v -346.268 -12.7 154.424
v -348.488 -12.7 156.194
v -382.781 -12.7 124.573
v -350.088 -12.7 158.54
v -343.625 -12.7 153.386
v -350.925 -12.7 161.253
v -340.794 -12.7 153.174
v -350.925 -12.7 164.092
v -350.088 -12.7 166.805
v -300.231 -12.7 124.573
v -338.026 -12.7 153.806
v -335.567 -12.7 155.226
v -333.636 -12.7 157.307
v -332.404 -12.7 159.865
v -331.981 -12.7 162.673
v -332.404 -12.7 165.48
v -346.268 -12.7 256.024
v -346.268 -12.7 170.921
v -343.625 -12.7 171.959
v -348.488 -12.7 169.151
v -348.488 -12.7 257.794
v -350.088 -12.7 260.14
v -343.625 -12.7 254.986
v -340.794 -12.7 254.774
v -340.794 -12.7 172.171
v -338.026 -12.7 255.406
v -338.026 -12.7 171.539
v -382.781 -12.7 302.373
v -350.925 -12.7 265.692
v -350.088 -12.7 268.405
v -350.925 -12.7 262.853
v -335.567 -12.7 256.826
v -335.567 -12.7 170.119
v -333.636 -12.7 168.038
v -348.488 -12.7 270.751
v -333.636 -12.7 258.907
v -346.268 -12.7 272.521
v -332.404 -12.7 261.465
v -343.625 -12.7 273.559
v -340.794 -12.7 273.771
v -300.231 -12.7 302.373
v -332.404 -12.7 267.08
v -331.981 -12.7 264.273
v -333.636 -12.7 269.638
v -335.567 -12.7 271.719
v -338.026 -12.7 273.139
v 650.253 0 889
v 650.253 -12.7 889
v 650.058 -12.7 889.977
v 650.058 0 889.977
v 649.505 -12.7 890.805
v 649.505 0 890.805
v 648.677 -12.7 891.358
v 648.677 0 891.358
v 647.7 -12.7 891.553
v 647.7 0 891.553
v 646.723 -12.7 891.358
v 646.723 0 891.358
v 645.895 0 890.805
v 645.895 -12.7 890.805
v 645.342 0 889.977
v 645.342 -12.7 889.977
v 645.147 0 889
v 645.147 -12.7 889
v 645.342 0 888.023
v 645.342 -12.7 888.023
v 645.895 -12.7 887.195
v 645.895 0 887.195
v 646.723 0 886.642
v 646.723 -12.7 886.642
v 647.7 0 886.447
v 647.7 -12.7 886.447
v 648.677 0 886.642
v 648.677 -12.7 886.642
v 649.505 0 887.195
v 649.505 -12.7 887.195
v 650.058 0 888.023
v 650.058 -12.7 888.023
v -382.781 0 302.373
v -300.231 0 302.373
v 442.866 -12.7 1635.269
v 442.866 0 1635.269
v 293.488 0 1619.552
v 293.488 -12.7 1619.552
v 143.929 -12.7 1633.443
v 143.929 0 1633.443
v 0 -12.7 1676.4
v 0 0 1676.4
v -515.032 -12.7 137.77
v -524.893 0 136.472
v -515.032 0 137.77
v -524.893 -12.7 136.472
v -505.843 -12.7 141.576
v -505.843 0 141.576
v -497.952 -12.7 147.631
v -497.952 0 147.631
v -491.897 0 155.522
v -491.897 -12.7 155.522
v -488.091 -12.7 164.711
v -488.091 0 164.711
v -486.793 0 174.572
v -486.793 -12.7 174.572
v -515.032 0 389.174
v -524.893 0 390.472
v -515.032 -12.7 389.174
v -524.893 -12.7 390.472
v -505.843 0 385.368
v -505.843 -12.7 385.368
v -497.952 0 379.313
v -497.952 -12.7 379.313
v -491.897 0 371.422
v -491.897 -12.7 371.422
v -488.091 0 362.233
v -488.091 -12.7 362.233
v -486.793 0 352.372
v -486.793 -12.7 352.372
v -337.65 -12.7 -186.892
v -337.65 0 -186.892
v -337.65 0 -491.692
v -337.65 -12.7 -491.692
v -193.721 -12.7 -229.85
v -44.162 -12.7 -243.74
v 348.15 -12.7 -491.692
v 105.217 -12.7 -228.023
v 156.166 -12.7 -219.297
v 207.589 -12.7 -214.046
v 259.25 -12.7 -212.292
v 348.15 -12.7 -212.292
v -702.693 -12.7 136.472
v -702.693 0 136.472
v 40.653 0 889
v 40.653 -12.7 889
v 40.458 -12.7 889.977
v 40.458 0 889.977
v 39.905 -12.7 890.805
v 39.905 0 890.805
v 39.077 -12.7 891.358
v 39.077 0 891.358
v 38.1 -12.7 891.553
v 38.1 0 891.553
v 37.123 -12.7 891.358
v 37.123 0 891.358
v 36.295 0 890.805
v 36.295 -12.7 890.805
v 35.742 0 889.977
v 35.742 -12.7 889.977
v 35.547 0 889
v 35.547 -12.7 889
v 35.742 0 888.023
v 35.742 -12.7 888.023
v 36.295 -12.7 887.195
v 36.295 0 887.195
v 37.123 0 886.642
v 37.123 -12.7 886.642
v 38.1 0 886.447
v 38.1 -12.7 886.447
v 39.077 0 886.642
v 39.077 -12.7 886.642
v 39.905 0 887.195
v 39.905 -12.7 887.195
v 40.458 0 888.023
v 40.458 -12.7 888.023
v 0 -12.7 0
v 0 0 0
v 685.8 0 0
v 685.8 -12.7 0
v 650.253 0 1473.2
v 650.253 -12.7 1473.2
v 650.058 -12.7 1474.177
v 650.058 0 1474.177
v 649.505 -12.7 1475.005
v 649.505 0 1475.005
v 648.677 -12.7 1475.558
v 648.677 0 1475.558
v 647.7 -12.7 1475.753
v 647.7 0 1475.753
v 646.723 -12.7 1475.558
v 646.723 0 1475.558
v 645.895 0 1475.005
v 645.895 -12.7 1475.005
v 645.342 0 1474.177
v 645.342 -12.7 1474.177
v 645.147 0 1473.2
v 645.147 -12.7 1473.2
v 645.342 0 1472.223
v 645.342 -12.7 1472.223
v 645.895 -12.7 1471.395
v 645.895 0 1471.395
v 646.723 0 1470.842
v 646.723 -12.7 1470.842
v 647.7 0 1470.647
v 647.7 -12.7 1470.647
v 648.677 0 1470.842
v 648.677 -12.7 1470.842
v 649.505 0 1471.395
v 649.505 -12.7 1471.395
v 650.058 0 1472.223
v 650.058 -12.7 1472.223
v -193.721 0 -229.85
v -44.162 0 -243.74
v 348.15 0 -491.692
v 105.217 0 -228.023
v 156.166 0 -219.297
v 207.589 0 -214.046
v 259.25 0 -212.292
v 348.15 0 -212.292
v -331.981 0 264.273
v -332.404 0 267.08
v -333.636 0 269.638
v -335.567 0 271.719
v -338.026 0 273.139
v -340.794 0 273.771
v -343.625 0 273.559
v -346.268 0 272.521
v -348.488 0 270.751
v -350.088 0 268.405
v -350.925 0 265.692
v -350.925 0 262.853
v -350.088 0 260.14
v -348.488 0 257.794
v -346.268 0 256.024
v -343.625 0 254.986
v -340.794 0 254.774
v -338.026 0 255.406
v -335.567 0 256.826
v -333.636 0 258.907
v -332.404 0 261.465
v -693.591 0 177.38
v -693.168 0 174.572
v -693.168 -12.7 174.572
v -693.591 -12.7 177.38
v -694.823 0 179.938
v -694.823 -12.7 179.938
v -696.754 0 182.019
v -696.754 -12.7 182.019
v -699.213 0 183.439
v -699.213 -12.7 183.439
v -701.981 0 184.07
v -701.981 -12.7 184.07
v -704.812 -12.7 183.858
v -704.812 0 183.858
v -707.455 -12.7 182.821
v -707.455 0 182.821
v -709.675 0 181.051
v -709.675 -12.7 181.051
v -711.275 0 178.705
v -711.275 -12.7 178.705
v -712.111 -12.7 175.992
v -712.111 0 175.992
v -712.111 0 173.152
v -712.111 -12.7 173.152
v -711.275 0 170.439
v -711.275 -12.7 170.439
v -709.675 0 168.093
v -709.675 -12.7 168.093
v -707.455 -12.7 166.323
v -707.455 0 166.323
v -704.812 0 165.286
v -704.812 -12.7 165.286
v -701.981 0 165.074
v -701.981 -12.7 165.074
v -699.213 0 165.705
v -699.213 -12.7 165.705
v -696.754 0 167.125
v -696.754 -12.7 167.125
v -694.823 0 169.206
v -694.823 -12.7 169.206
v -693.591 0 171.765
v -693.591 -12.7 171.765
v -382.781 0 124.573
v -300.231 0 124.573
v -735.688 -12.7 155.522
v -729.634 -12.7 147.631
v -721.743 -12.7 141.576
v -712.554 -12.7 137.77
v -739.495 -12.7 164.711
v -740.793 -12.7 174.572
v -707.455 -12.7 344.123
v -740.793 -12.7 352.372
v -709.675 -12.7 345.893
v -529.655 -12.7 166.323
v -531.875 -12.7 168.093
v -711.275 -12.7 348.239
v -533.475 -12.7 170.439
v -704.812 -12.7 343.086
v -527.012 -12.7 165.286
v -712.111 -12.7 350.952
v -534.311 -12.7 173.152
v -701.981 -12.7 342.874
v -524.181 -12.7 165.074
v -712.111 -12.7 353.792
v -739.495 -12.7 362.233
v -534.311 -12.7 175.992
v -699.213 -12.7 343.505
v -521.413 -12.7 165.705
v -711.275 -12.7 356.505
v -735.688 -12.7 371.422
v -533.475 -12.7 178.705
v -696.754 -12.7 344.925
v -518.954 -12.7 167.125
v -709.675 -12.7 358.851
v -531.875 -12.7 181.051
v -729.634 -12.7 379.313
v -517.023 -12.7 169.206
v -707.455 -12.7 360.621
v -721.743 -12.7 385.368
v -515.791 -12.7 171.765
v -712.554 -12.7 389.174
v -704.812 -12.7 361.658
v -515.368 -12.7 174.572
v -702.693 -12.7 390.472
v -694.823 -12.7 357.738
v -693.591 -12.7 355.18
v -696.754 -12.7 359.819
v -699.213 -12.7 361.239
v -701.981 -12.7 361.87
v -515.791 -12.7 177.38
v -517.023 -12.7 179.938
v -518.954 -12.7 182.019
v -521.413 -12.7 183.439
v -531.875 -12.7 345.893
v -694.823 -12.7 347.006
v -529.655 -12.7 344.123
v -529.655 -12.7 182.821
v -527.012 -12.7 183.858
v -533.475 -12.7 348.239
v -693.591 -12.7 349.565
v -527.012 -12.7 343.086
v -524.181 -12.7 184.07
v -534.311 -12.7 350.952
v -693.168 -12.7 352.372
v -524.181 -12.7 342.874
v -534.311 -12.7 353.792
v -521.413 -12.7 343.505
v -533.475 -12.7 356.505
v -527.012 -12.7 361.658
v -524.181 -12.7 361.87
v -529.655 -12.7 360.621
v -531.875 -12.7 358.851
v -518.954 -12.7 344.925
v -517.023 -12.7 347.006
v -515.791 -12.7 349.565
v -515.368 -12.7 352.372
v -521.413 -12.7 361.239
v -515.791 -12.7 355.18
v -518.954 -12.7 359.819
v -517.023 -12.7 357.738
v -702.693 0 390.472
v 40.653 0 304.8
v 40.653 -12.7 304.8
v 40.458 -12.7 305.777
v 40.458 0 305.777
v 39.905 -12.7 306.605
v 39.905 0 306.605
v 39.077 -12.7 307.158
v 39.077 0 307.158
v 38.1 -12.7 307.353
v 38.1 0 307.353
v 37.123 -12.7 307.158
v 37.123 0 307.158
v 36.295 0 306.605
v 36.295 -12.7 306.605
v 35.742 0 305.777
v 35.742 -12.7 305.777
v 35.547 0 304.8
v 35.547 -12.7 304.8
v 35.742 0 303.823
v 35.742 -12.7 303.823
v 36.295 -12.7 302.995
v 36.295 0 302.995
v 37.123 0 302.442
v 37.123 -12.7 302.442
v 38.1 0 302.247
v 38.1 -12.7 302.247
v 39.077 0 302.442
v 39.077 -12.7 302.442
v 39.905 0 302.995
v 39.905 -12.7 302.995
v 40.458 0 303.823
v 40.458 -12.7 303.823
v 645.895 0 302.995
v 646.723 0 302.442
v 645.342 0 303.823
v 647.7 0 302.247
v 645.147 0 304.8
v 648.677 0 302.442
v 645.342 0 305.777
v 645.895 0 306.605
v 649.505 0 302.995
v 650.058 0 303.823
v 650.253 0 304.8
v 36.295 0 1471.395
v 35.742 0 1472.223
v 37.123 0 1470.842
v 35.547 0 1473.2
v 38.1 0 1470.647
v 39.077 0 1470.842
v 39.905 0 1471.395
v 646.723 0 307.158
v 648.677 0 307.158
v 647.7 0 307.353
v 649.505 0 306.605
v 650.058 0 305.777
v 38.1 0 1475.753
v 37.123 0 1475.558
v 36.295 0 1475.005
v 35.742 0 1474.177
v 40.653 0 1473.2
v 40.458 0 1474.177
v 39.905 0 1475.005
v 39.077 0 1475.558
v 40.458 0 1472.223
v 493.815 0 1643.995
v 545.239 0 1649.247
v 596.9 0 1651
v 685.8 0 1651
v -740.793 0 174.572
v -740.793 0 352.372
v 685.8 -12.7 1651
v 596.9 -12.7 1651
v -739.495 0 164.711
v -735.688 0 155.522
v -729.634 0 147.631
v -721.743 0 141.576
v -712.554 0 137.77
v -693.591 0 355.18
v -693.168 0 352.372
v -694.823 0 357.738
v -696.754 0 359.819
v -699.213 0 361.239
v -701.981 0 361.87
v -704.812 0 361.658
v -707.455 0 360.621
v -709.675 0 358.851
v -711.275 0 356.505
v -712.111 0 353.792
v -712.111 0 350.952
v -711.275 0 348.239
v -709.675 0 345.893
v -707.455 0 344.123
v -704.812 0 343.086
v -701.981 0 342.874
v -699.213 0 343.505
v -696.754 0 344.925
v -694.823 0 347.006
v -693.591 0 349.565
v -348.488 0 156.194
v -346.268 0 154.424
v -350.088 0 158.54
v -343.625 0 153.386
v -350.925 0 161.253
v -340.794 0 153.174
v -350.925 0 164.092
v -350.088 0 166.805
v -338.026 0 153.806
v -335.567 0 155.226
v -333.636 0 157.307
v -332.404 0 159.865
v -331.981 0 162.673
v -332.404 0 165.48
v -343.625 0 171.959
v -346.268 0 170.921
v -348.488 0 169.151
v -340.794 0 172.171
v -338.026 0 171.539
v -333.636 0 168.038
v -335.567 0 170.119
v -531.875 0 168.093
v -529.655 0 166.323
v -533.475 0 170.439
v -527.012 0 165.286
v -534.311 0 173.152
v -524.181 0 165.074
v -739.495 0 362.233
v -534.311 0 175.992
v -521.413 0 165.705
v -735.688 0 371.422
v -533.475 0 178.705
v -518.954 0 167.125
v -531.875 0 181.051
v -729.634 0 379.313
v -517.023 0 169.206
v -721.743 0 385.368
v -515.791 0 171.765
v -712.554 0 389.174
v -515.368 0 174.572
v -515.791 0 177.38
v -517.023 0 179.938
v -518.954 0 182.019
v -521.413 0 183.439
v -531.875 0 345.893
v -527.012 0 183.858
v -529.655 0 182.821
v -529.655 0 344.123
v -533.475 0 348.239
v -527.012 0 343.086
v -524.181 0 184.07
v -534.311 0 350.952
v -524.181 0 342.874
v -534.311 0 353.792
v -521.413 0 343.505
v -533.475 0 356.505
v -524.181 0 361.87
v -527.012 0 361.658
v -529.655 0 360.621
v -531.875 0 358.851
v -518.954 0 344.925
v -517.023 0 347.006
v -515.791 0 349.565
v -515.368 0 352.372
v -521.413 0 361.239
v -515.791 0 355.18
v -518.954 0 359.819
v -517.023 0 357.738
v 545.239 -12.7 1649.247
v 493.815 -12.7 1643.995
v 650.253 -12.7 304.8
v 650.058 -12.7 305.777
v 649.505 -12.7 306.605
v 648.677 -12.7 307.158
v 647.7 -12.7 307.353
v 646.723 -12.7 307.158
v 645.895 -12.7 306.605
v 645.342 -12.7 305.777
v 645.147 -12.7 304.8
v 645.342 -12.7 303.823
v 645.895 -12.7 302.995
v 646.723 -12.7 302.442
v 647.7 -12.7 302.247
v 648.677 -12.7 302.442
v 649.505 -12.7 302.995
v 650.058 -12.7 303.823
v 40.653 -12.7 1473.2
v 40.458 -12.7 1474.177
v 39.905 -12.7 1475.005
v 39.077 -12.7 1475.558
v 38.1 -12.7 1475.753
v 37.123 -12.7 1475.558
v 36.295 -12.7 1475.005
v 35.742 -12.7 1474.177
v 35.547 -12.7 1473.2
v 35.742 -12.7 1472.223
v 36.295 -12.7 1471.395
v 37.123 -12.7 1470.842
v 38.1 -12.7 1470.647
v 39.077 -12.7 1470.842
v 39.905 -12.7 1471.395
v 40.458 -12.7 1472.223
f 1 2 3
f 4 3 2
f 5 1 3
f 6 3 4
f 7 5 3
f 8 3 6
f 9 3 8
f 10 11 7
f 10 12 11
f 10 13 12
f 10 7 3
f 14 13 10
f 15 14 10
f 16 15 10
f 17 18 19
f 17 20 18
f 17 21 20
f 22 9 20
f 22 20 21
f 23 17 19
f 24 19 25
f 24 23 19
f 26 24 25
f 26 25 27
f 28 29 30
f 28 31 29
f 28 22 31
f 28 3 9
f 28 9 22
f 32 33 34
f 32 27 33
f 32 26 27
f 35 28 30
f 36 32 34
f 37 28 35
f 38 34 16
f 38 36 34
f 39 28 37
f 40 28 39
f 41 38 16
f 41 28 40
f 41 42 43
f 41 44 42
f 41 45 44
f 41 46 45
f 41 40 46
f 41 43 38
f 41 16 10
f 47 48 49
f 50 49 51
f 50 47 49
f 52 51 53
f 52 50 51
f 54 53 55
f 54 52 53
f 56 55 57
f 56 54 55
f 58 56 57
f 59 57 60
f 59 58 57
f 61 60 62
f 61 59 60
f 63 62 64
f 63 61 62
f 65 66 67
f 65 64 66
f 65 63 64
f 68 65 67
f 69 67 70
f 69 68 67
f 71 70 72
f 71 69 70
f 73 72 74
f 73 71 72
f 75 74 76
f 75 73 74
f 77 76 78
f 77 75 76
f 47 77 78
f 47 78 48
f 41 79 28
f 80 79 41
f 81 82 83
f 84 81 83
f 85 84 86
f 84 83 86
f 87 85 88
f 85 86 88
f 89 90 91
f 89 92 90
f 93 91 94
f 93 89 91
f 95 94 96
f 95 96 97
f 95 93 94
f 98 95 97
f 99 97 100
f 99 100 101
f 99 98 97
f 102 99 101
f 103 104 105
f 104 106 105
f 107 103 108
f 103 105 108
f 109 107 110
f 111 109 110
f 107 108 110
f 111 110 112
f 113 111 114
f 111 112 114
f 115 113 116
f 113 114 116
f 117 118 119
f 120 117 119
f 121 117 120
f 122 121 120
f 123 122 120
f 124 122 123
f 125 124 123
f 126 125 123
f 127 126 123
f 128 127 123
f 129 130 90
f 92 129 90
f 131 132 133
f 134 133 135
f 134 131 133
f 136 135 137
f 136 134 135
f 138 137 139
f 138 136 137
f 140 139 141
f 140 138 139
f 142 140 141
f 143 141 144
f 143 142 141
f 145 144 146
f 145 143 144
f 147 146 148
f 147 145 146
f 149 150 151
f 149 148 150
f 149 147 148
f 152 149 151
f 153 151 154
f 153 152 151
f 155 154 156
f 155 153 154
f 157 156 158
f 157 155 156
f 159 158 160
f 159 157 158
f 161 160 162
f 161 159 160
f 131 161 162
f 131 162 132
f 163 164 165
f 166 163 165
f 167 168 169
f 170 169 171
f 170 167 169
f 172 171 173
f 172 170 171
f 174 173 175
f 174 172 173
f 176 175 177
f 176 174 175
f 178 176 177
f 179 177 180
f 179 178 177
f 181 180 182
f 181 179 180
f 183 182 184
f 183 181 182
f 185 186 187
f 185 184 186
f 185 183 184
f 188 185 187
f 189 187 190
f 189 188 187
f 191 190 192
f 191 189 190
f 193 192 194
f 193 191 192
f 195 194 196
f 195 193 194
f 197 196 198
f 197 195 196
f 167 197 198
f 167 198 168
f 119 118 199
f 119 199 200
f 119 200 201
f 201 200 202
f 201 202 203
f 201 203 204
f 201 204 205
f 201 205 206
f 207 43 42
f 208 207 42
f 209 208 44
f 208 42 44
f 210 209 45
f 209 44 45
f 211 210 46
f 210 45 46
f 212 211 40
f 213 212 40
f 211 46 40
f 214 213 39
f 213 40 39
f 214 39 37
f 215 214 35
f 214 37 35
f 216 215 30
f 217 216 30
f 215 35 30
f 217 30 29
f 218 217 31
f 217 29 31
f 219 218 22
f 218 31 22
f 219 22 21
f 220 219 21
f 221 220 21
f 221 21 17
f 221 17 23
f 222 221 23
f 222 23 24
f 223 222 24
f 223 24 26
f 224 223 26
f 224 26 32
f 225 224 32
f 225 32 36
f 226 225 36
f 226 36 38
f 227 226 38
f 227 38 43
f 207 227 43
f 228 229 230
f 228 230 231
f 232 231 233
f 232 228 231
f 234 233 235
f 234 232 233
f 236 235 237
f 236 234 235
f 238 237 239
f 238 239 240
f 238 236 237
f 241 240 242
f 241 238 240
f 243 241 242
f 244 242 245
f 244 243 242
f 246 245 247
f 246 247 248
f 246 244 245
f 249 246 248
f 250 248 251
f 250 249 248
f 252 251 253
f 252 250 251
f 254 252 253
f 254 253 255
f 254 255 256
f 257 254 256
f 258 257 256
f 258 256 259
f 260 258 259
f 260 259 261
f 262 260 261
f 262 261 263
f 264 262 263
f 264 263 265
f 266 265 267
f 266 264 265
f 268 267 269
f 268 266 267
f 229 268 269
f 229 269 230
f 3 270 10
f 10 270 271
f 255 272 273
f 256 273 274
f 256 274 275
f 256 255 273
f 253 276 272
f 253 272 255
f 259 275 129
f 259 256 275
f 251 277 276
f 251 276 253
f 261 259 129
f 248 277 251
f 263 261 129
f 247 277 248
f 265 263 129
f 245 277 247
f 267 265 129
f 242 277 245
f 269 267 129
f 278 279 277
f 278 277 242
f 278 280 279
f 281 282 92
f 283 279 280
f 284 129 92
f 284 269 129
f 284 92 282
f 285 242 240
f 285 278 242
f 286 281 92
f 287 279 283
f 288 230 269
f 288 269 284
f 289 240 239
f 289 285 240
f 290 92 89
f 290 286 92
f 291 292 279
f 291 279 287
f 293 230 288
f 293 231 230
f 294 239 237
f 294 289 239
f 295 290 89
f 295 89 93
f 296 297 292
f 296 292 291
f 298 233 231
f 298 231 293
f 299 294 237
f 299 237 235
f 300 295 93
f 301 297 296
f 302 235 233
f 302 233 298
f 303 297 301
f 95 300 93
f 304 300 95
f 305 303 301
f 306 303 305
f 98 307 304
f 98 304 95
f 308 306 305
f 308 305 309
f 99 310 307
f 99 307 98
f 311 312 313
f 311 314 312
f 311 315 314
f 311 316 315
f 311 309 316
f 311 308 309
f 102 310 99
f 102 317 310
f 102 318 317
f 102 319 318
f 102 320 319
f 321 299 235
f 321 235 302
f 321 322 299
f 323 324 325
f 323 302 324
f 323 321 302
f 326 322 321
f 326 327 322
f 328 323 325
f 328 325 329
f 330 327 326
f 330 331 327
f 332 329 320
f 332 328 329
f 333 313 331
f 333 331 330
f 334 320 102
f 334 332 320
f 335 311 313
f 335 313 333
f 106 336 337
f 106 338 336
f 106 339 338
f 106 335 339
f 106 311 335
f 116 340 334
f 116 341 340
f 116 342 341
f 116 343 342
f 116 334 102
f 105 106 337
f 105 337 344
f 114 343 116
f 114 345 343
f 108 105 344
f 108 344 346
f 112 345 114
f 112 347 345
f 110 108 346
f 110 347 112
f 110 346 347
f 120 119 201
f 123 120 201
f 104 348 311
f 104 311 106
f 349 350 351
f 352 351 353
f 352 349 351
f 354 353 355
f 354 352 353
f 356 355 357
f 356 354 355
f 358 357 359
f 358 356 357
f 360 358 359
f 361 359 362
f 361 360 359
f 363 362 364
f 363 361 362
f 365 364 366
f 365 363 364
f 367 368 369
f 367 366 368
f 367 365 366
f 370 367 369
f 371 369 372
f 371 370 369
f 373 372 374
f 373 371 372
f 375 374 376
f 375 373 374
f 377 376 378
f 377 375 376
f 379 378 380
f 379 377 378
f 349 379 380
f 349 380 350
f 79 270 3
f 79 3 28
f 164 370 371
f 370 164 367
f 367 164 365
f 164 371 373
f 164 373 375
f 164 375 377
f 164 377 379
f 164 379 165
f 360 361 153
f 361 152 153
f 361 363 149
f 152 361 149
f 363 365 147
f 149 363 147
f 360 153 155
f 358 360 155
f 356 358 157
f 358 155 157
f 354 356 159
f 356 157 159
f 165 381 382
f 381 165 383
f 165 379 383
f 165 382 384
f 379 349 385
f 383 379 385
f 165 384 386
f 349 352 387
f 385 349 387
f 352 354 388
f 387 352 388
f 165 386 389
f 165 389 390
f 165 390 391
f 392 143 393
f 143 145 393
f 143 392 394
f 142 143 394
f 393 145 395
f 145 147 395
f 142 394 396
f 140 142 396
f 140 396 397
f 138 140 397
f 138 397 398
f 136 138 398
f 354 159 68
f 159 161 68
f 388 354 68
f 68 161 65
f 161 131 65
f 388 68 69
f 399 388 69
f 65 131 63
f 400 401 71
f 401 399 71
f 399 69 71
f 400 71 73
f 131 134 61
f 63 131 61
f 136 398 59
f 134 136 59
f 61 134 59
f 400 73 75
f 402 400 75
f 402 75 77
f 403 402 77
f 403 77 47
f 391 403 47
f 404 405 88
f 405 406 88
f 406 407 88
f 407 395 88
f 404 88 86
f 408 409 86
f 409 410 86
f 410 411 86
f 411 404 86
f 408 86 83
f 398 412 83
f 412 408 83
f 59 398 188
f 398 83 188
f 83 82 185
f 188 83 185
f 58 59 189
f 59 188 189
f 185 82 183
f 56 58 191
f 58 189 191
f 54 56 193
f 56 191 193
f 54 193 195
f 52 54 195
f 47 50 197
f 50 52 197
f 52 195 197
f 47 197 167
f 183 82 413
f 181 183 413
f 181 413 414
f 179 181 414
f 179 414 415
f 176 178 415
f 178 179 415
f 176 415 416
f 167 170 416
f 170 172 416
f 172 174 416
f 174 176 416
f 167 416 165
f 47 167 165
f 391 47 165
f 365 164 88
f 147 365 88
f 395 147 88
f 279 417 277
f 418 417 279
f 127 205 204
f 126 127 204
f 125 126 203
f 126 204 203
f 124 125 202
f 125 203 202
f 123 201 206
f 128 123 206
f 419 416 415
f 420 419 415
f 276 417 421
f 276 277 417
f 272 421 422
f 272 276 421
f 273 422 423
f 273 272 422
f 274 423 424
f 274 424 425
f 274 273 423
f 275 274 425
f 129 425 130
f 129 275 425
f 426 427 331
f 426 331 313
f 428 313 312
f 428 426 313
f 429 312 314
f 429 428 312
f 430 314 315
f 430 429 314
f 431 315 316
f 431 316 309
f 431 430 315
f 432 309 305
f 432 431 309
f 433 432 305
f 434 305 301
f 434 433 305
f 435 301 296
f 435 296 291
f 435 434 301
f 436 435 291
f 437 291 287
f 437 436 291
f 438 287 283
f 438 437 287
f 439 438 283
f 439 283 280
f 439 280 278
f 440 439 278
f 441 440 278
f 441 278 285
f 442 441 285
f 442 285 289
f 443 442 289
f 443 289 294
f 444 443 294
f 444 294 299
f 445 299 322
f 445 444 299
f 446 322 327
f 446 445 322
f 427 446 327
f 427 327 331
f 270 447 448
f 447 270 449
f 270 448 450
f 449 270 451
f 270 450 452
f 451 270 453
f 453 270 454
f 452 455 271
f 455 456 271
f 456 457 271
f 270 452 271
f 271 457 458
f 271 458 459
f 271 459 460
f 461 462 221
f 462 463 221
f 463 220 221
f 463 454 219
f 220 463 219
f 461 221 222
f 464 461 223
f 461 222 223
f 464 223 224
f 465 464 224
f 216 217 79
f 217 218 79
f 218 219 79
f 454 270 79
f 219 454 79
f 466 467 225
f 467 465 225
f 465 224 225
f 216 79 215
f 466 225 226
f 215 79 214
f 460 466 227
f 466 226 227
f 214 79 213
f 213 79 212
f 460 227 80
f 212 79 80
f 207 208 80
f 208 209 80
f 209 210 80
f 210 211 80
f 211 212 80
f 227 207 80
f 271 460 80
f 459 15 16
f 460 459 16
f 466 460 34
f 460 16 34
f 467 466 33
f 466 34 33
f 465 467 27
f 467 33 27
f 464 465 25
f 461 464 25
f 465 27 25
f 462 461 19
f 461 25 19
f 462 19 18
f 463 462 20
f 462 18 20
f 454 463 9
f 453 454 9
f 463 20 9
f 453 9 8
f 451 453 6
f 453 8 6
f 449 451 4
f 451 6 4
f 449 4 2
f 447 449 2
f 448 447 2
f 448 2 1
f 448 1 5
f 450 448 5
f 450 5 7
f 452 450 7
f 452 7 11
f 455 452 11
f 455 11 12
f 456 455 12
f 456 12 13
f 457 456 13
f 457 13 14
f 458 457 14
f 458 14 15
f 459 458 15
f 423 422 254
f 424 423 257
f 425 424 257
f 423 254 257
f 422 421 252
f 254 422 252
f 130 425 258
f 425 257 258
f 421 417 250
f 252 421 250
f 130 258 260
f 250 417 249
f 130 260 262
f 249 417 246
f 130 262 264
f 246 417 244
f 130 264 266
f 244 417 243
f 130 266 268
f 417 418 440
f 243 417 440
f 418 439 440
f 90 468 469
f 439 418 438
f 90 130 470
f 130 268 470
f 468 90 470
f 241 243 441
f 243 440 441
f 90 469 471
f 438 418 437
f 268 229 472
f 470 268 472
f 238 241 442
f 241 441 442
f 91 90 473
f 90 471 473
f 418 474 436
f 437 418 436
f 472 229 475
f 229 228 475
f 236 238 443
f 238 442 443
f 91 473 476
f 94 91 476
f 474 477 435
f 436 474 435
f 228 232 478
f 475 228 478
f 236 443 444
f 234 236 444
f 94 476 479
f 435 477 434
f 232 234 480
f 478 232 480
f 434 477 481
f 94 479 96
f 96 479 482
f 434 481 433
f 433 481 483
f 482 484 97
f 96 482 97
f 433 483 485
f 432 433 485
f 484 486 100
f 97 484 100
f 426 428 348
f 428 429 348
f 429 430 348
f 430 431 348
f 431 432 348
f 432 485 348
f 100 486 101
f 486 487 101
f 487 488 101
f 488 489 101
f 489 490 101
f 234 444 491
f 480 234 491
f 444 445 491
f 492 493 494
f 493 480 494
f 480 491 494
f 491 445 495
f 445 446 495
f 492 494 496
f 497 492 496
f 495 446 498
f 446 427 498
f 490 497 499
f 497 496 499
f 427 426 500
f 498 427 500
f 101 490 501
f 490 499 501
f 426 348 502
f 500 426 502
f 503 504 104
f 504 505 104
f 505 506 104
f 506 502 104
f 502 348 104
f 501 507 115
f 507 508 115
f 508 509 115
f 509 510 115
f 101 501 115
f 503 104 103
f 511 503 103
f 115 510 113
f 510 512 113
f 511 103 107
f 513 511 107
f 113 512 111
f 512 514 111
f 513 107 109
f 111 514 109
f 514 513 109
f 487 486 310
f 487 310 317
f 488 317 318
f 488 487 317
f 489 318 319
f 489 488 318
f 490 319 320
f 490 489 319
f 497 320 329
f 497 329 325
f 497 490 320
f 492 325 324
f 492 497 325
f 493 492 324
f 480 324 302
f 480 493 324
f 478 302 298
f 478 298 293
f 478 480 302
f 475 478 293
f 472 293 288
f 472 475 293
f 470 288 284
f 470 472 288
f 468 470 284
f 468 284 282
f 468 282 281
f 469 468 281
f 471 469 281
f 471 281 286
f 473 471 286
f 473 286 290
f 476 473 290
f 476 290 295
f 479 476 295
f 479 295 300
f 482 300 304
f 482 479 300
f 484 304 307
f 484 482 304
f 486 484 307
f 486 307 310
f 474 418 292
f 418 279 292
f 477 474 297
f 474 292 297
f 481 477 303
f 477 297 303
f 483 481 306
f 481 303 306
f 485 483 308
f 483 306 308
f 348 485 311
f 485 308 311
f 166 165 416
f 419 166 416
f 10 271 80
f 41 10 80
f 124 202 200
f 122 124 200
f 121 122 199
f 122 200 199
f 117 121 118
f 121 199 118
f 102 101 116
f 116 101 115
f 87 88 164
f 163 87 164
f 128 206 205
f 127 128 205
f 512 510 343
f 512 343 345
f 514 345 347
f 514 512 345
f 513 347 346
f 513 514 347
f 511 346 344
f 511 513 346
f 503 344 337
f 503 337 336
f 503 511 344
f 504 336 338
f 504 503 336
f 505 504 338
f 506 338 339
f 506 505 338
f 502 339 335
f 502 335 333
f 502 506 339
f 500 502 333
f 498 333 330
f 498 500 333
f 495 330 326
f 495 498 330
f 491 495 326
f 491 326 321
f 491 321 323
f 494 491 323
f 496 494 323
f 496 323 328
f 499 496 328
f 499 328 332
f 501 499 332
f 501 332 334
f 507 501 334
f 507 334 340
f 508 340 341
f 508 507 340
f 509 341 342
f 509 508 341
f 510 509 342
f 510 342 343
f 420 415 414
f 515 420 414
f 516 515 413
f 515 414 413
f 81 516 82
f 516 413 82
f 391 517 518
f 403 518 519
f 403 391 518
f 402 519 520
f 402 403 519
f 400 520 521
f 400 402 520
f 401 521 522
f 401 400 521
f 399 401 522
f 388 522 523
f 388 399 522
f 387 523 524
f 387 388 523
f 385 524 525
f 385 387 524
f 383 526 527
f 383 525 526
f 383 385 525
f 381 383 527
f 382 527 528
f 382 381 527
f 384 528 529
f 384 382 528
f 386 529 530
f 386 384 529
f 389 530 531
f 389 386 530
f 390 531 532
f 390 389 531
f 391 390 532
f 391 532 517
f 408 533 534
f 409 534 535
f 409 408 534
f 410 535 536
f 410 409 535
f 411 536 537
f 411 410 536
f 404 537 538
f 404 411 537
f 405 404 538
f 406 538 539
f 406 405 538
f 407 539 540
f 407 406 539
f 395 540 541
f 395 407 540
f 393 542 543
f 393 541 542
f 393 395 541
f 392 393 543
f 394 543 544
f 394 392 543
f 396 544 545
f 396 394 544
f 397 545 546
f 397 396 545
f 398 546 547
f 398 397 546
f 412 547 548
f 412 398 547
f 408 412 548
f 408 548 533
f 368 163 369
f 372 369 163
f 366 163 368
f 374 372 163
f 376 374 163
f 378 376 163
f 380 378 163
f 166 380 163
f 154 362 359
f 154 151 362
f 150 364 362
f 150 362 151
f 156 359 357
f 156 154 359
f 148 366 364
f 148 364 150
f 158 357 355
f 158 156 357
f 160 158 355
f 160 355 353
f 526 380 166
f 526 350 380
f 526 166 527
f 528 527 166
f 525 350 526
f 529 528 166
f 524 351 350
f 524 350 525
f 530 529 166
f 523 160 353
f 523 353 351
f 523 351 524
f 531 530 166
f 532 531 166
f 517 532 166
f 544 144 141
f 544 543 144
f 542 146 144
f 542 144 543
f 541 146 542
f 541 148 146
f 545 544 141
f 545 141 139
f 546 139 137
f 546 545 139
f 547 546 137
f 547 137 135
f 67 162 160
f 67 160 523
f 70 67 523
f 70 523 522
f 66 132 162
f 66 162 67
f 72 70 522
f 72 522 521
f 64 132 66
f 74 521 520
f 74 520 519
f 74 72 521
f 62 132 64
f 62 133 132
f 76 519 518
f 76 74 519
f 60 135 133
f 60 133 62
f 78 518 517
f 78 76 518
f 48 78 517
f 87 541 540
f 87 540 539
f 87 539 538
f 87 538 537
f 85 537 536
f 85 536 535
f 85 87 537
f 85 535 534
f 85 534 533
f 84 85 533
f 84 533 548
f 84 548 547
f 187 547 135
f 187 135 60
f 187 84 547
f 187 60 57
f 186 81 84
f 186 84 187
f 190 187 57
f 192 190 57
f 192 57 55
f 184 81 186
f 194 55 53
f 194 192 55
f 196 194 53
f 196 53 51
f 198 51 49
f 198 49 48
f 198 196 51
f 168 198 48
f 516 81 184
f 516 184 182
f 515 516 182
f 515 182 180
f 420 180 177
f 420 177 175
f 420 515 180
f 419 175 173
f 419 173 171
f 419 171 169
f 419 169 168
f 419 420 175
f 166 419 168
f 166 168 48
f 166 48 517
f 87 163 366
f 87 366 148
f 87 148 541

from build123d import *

# Parameters (mm, degrees)
F1_DEPTH  = 12.7
F2_R      = 2.5527
F3_DEPTH  = 12.701
F4_W      = 254
F4_H      = 254
F4_R      = 9.525
F5_DEPTH  = 12.7
F6_R      = 38.1
F7_W      = 82.55
F7_H      = 177.8
F8_DEPTH  = 12.7
F9_R      = 9.525
F10_DEPTH = 12.701
F12_DEPTH = 12.7


with BuildPart() as f1:
    # F0 (on Front) → F1 (new body)
    with BuildSketch(Plane.XZ):
        with BuildLine():
            Line((0, 1651), (0, 0))
            Line((0, 0), (685.8, 0))
            Line((685.8, 0), (685.8, 1651))
            Line((685.8, 1651), (596.9, 1651))
            ThreePointArc((596.9, 1651), (519.482487, 1647.057075), (442.866159, 1635.269104))
            ThreePointArc((442.866159, 1635.269104), (218.36534, 1622.803469), (0, 1676.4))
            Line((0, 1676.4), (0, 1651))
        make_face()
    extrude(amount=F1_DEPTH)

    # F2 (on Front) → F3 (cut, through all)
    with BuildSketch(Plane.XZ):
        with Locations((38.1, 1473.2)):
            Circle(F2_R)
        with Locations((38.1, 889)):
            Circle(F2_R)
        with Locations((38.1, 304.8)):
            Circle(F2_R)
        with Locations((647.7, 1473.2)):
            Circle(F2_R)
        with Locations((647.7, 889)):
            Circle(F2_R)
        with Locations((647.7, 304.8)):
            Circle(F2_R)
    extrude(amount=F3_DEPTH, mode=Mode.SUBTRACT)


with BuildPart() as f5:
    # F4 (on Front) → F5 (new body)
    with BuildSketch(Plane.XZ):
        with Locations((-613.792803, 263.472061)):
            Rectangle(F4_W, F4_H)
        with Locations((-702.692803, 174.572061)):
            Circle(F4_R, mode=Mode.SUBTRACT)
        with Locations((-524.892803, 174.572061)):
            Circle(F4_R, mode=Mode.SUBTRACT)
        with Locations((-702.692803, 352.372061)):
            Circle(F4_R, mode=Mode.SUBTRACT)
        with Locations((-524.892803, 352.372061)):
            Circle(F4_R, mode=Mode.SUBTRACT)
    extrude(amount=F5_DEPTH)

    # F6
    f6_edges = [f5.edges().sort_by_distance(p)[0] for p in [
        (-486.792803, -6.35, 390.472061),
        (-740.792803, -6.35, 390.472061),
        (-486.792803, -6.35, 136.472061),
        (-740.792803, -6.35, 136.472061),
    ]]
    fillet(f6_edges, radius=F6_R)


with BuildPart() as f8:
    # F7 (on Front) → F8 (new body)
    with BuildSketch(Plane.XZ):
        with Locations((-341.505891, 213.472515)):
            Rectangle(F7_W, F7_H)
    extrude(amount=F8_DEPTH)

    # F9 (on face) → F10 (cut, through all)
    with BuildSketch(Plane.XZ.offset(12.7)):
        with Locations((-341.505891, 264.272515)):
            Circle(F9_R)
        with Locations((-341.505891, 162.672515)):
            Circle(F9_R)
    extrude(amount=-F10_DEPTH, mode=Mode.SUBTRACT)


with BuildPart() as f12:
    # F11 (on Front) → F12 (new body)
    with BuildSketch(Plane.XZ):
        with BuildLine():
            Line((-337.649525, -186.89242), (-337.649525, -491.69242))
            Line((-337.649525, -491.69242), (348.150475, -491.69242))
            Line((348.150475, -491.69242), (348.150475, -212.29242))
            Line((348.150475, -212.29242), (259.250475, -212.29242))
            ThreePointArc((259.250475, -212.29242), (181.832962, -216.235345), (105.216634, -228.023316))
            ThreePointArc((105.216634, -228.023316), (-119.284185, -240.488952), (-337.649525, -186.89242))
        make_face()
    extrude(amount=F12_DEPTH)


solid = Compound([f1.part, f5.part, f8.part, f12.part])
